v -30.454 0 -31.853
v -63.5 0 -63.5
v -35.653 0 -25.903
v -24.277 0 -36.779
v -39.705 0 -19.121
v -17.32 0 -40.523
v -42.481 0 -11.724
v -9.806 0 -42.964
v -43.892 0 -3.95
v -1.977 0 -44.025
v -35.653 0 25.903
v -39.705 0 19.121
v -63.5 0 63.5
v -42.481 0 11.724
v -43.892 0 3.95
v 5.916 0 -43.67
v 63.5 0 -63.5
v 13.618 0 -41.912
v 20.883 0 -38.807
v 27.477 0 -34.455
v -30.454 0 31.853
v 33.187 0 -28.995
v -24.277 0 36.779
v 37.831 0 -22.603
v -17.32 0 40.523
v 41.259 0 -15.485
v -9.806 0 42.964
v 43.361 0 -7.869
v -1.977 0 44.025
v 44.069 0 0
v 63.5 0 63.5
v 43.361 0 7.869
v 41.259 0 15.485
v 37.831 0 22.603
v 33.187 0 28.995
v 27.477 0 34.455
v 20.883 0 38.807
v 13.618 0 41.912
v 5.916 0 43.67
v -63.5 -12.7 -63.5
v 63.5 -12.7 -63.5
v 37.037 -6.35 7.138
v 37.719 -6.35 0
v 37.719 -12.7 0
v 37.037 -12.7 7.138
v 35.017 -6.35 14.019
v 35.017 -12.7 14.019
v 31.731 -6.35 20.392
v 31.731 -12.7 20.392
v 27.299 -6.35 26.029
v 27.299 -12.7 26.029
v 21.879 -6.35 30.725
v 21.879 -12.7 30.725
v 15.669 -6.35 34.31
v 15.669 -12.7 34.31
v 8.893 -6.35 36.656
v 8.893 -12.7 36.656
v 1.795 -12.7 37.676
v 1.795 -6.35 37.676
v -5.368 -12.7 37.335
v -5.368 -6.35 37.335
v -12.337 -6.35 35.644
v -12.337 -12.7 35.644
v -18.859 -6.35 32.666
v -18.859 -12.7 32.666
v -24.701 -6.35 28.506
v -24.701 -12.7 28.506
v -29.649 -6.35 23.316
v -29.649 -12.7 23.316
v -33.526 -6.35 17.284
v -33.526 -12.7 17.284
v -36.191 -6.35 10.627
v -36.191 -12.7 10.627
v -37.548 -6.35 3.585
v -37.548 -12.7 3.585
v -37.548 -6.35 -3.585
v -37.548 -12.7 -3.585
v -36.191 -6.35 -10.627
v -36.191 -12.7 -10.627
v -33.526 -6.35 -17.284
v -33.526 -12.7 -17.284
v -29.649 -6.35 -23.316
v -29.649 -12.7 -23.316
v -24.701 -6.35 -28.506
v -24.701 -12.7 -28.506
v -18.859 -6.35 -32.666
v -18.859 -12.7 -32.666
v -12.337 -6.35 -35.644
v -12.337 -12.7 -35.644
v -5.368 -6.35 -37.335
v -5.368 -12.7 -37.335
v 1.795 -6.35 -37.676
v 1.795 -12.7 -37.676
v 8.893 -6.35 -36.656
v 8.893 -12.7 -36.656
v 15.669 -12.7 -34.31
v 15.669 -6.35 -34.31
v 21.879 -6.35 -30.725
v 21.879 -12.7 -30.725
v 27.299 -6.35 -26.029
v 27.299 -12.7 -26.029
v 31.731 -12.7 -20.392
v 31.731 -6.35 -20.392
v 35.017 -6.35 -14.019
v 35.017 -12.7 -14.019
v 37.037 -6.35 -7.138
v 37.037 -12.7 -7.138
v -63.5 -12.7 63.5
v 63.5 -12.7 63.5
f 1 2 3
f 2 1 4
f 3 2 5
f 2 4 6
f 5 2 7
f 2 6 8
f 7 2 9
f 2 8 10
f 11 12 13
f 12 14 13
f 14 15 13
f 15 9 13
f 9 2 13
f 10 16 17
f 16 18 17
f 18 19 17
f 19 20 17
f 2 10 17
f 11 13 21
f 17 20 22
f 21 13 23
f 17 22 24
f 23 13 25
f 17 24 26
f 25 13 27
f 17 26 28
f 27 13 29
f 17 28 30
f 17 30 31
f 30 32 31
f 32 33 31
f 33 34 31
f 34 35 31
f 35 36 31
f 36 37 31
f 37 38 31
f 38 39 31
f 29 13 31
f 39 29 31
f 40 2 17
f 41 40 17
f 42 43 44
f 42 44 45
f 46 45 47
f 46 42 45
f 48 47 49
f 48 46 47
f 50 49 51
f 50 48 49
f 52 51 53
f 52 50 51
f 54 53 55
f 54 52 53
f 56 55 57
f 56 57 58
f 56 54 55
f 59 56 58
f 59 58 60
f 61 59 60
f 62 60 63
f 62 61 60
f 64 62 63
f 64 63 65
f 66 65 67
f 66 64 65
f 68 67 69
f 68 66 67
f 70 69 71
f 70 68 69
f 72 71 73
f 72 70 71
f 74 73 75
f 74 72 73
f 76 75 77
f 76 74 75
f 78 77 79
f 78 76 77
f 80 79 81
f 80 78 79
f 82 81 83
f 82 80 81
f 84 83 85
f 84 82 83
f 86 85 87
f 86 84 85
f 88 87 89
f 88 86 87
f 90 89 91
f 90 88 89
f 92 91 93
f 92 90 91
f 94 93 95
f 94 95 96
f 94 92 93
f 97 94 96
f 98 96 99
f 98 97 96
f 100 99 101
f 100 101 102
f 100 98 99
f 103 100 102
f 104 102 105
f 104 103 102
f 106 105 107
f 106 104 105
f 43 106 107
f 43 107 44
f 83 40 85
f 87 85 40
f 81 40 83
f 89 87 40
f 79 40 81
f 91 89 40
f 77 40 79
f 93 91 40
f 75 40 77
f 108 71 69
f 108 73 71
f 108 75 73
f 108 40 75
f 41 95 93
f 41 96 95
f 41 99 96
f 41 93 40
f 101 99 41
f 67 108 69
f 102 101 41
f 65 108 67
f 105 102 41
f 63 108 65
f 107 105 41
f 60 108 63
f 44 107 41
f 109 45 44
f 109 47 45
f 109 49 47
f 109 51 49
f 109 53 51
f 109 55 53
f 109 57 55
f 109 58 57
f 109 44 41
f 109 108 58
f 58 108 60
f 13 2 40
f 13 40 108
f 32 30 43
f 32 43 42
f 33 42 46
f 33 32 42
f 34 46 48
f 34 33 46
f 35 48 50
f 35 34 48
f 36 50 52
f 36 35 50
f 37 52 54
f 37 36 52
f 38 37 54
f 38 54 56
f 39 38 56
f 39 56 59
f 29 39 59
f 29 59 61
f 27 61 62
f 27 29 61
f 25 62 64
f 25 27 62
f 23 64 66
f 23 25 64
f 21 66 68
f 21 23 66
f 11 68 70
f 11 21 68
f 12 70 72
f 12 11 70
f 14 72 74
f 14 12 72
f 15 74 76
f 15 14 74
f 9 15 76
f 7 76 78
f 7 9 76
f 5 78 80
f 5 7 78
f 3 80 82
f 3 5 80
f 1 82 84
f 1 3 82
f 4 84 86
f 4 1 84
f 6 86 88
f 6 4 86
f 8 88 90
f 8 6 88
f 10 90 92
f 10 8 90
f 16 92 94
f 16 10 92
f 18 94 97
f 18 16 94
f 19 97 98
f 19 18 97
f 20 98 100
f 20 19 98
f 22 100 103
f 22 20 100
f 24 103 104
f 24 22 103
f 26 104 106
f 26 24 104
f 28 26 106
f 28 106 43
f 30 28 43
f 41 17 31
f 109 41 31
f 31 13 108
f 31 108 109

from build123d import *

# Parameters (mm, degrees)
F0_W     = 127
F0_H     = 127
F0_R     = 37.719
F1_DEPTH = 12.7
F2_SIZE2 = 6.35
F2_SIZE  = 6.35


with BuildPart() as f1:
    # F0 (on Front) → F1 (new body)
    with BuildSketch(Plane.XZ):
        Rectangle(F0_W, F0_H)
        Circle(F0_R, mode=Mode.SUBTRACT)
    extrude(amount=F1_DEPTH)

    # F2
    f2_edges = [f1.edges().sort_by_distance(p)[0] for p in [
        (-37.719, 0, 0),
    ]]
    chamfer(f2_edges, length=F2_SIZE, length2=F2_SIZE2)


solid = f1.part
